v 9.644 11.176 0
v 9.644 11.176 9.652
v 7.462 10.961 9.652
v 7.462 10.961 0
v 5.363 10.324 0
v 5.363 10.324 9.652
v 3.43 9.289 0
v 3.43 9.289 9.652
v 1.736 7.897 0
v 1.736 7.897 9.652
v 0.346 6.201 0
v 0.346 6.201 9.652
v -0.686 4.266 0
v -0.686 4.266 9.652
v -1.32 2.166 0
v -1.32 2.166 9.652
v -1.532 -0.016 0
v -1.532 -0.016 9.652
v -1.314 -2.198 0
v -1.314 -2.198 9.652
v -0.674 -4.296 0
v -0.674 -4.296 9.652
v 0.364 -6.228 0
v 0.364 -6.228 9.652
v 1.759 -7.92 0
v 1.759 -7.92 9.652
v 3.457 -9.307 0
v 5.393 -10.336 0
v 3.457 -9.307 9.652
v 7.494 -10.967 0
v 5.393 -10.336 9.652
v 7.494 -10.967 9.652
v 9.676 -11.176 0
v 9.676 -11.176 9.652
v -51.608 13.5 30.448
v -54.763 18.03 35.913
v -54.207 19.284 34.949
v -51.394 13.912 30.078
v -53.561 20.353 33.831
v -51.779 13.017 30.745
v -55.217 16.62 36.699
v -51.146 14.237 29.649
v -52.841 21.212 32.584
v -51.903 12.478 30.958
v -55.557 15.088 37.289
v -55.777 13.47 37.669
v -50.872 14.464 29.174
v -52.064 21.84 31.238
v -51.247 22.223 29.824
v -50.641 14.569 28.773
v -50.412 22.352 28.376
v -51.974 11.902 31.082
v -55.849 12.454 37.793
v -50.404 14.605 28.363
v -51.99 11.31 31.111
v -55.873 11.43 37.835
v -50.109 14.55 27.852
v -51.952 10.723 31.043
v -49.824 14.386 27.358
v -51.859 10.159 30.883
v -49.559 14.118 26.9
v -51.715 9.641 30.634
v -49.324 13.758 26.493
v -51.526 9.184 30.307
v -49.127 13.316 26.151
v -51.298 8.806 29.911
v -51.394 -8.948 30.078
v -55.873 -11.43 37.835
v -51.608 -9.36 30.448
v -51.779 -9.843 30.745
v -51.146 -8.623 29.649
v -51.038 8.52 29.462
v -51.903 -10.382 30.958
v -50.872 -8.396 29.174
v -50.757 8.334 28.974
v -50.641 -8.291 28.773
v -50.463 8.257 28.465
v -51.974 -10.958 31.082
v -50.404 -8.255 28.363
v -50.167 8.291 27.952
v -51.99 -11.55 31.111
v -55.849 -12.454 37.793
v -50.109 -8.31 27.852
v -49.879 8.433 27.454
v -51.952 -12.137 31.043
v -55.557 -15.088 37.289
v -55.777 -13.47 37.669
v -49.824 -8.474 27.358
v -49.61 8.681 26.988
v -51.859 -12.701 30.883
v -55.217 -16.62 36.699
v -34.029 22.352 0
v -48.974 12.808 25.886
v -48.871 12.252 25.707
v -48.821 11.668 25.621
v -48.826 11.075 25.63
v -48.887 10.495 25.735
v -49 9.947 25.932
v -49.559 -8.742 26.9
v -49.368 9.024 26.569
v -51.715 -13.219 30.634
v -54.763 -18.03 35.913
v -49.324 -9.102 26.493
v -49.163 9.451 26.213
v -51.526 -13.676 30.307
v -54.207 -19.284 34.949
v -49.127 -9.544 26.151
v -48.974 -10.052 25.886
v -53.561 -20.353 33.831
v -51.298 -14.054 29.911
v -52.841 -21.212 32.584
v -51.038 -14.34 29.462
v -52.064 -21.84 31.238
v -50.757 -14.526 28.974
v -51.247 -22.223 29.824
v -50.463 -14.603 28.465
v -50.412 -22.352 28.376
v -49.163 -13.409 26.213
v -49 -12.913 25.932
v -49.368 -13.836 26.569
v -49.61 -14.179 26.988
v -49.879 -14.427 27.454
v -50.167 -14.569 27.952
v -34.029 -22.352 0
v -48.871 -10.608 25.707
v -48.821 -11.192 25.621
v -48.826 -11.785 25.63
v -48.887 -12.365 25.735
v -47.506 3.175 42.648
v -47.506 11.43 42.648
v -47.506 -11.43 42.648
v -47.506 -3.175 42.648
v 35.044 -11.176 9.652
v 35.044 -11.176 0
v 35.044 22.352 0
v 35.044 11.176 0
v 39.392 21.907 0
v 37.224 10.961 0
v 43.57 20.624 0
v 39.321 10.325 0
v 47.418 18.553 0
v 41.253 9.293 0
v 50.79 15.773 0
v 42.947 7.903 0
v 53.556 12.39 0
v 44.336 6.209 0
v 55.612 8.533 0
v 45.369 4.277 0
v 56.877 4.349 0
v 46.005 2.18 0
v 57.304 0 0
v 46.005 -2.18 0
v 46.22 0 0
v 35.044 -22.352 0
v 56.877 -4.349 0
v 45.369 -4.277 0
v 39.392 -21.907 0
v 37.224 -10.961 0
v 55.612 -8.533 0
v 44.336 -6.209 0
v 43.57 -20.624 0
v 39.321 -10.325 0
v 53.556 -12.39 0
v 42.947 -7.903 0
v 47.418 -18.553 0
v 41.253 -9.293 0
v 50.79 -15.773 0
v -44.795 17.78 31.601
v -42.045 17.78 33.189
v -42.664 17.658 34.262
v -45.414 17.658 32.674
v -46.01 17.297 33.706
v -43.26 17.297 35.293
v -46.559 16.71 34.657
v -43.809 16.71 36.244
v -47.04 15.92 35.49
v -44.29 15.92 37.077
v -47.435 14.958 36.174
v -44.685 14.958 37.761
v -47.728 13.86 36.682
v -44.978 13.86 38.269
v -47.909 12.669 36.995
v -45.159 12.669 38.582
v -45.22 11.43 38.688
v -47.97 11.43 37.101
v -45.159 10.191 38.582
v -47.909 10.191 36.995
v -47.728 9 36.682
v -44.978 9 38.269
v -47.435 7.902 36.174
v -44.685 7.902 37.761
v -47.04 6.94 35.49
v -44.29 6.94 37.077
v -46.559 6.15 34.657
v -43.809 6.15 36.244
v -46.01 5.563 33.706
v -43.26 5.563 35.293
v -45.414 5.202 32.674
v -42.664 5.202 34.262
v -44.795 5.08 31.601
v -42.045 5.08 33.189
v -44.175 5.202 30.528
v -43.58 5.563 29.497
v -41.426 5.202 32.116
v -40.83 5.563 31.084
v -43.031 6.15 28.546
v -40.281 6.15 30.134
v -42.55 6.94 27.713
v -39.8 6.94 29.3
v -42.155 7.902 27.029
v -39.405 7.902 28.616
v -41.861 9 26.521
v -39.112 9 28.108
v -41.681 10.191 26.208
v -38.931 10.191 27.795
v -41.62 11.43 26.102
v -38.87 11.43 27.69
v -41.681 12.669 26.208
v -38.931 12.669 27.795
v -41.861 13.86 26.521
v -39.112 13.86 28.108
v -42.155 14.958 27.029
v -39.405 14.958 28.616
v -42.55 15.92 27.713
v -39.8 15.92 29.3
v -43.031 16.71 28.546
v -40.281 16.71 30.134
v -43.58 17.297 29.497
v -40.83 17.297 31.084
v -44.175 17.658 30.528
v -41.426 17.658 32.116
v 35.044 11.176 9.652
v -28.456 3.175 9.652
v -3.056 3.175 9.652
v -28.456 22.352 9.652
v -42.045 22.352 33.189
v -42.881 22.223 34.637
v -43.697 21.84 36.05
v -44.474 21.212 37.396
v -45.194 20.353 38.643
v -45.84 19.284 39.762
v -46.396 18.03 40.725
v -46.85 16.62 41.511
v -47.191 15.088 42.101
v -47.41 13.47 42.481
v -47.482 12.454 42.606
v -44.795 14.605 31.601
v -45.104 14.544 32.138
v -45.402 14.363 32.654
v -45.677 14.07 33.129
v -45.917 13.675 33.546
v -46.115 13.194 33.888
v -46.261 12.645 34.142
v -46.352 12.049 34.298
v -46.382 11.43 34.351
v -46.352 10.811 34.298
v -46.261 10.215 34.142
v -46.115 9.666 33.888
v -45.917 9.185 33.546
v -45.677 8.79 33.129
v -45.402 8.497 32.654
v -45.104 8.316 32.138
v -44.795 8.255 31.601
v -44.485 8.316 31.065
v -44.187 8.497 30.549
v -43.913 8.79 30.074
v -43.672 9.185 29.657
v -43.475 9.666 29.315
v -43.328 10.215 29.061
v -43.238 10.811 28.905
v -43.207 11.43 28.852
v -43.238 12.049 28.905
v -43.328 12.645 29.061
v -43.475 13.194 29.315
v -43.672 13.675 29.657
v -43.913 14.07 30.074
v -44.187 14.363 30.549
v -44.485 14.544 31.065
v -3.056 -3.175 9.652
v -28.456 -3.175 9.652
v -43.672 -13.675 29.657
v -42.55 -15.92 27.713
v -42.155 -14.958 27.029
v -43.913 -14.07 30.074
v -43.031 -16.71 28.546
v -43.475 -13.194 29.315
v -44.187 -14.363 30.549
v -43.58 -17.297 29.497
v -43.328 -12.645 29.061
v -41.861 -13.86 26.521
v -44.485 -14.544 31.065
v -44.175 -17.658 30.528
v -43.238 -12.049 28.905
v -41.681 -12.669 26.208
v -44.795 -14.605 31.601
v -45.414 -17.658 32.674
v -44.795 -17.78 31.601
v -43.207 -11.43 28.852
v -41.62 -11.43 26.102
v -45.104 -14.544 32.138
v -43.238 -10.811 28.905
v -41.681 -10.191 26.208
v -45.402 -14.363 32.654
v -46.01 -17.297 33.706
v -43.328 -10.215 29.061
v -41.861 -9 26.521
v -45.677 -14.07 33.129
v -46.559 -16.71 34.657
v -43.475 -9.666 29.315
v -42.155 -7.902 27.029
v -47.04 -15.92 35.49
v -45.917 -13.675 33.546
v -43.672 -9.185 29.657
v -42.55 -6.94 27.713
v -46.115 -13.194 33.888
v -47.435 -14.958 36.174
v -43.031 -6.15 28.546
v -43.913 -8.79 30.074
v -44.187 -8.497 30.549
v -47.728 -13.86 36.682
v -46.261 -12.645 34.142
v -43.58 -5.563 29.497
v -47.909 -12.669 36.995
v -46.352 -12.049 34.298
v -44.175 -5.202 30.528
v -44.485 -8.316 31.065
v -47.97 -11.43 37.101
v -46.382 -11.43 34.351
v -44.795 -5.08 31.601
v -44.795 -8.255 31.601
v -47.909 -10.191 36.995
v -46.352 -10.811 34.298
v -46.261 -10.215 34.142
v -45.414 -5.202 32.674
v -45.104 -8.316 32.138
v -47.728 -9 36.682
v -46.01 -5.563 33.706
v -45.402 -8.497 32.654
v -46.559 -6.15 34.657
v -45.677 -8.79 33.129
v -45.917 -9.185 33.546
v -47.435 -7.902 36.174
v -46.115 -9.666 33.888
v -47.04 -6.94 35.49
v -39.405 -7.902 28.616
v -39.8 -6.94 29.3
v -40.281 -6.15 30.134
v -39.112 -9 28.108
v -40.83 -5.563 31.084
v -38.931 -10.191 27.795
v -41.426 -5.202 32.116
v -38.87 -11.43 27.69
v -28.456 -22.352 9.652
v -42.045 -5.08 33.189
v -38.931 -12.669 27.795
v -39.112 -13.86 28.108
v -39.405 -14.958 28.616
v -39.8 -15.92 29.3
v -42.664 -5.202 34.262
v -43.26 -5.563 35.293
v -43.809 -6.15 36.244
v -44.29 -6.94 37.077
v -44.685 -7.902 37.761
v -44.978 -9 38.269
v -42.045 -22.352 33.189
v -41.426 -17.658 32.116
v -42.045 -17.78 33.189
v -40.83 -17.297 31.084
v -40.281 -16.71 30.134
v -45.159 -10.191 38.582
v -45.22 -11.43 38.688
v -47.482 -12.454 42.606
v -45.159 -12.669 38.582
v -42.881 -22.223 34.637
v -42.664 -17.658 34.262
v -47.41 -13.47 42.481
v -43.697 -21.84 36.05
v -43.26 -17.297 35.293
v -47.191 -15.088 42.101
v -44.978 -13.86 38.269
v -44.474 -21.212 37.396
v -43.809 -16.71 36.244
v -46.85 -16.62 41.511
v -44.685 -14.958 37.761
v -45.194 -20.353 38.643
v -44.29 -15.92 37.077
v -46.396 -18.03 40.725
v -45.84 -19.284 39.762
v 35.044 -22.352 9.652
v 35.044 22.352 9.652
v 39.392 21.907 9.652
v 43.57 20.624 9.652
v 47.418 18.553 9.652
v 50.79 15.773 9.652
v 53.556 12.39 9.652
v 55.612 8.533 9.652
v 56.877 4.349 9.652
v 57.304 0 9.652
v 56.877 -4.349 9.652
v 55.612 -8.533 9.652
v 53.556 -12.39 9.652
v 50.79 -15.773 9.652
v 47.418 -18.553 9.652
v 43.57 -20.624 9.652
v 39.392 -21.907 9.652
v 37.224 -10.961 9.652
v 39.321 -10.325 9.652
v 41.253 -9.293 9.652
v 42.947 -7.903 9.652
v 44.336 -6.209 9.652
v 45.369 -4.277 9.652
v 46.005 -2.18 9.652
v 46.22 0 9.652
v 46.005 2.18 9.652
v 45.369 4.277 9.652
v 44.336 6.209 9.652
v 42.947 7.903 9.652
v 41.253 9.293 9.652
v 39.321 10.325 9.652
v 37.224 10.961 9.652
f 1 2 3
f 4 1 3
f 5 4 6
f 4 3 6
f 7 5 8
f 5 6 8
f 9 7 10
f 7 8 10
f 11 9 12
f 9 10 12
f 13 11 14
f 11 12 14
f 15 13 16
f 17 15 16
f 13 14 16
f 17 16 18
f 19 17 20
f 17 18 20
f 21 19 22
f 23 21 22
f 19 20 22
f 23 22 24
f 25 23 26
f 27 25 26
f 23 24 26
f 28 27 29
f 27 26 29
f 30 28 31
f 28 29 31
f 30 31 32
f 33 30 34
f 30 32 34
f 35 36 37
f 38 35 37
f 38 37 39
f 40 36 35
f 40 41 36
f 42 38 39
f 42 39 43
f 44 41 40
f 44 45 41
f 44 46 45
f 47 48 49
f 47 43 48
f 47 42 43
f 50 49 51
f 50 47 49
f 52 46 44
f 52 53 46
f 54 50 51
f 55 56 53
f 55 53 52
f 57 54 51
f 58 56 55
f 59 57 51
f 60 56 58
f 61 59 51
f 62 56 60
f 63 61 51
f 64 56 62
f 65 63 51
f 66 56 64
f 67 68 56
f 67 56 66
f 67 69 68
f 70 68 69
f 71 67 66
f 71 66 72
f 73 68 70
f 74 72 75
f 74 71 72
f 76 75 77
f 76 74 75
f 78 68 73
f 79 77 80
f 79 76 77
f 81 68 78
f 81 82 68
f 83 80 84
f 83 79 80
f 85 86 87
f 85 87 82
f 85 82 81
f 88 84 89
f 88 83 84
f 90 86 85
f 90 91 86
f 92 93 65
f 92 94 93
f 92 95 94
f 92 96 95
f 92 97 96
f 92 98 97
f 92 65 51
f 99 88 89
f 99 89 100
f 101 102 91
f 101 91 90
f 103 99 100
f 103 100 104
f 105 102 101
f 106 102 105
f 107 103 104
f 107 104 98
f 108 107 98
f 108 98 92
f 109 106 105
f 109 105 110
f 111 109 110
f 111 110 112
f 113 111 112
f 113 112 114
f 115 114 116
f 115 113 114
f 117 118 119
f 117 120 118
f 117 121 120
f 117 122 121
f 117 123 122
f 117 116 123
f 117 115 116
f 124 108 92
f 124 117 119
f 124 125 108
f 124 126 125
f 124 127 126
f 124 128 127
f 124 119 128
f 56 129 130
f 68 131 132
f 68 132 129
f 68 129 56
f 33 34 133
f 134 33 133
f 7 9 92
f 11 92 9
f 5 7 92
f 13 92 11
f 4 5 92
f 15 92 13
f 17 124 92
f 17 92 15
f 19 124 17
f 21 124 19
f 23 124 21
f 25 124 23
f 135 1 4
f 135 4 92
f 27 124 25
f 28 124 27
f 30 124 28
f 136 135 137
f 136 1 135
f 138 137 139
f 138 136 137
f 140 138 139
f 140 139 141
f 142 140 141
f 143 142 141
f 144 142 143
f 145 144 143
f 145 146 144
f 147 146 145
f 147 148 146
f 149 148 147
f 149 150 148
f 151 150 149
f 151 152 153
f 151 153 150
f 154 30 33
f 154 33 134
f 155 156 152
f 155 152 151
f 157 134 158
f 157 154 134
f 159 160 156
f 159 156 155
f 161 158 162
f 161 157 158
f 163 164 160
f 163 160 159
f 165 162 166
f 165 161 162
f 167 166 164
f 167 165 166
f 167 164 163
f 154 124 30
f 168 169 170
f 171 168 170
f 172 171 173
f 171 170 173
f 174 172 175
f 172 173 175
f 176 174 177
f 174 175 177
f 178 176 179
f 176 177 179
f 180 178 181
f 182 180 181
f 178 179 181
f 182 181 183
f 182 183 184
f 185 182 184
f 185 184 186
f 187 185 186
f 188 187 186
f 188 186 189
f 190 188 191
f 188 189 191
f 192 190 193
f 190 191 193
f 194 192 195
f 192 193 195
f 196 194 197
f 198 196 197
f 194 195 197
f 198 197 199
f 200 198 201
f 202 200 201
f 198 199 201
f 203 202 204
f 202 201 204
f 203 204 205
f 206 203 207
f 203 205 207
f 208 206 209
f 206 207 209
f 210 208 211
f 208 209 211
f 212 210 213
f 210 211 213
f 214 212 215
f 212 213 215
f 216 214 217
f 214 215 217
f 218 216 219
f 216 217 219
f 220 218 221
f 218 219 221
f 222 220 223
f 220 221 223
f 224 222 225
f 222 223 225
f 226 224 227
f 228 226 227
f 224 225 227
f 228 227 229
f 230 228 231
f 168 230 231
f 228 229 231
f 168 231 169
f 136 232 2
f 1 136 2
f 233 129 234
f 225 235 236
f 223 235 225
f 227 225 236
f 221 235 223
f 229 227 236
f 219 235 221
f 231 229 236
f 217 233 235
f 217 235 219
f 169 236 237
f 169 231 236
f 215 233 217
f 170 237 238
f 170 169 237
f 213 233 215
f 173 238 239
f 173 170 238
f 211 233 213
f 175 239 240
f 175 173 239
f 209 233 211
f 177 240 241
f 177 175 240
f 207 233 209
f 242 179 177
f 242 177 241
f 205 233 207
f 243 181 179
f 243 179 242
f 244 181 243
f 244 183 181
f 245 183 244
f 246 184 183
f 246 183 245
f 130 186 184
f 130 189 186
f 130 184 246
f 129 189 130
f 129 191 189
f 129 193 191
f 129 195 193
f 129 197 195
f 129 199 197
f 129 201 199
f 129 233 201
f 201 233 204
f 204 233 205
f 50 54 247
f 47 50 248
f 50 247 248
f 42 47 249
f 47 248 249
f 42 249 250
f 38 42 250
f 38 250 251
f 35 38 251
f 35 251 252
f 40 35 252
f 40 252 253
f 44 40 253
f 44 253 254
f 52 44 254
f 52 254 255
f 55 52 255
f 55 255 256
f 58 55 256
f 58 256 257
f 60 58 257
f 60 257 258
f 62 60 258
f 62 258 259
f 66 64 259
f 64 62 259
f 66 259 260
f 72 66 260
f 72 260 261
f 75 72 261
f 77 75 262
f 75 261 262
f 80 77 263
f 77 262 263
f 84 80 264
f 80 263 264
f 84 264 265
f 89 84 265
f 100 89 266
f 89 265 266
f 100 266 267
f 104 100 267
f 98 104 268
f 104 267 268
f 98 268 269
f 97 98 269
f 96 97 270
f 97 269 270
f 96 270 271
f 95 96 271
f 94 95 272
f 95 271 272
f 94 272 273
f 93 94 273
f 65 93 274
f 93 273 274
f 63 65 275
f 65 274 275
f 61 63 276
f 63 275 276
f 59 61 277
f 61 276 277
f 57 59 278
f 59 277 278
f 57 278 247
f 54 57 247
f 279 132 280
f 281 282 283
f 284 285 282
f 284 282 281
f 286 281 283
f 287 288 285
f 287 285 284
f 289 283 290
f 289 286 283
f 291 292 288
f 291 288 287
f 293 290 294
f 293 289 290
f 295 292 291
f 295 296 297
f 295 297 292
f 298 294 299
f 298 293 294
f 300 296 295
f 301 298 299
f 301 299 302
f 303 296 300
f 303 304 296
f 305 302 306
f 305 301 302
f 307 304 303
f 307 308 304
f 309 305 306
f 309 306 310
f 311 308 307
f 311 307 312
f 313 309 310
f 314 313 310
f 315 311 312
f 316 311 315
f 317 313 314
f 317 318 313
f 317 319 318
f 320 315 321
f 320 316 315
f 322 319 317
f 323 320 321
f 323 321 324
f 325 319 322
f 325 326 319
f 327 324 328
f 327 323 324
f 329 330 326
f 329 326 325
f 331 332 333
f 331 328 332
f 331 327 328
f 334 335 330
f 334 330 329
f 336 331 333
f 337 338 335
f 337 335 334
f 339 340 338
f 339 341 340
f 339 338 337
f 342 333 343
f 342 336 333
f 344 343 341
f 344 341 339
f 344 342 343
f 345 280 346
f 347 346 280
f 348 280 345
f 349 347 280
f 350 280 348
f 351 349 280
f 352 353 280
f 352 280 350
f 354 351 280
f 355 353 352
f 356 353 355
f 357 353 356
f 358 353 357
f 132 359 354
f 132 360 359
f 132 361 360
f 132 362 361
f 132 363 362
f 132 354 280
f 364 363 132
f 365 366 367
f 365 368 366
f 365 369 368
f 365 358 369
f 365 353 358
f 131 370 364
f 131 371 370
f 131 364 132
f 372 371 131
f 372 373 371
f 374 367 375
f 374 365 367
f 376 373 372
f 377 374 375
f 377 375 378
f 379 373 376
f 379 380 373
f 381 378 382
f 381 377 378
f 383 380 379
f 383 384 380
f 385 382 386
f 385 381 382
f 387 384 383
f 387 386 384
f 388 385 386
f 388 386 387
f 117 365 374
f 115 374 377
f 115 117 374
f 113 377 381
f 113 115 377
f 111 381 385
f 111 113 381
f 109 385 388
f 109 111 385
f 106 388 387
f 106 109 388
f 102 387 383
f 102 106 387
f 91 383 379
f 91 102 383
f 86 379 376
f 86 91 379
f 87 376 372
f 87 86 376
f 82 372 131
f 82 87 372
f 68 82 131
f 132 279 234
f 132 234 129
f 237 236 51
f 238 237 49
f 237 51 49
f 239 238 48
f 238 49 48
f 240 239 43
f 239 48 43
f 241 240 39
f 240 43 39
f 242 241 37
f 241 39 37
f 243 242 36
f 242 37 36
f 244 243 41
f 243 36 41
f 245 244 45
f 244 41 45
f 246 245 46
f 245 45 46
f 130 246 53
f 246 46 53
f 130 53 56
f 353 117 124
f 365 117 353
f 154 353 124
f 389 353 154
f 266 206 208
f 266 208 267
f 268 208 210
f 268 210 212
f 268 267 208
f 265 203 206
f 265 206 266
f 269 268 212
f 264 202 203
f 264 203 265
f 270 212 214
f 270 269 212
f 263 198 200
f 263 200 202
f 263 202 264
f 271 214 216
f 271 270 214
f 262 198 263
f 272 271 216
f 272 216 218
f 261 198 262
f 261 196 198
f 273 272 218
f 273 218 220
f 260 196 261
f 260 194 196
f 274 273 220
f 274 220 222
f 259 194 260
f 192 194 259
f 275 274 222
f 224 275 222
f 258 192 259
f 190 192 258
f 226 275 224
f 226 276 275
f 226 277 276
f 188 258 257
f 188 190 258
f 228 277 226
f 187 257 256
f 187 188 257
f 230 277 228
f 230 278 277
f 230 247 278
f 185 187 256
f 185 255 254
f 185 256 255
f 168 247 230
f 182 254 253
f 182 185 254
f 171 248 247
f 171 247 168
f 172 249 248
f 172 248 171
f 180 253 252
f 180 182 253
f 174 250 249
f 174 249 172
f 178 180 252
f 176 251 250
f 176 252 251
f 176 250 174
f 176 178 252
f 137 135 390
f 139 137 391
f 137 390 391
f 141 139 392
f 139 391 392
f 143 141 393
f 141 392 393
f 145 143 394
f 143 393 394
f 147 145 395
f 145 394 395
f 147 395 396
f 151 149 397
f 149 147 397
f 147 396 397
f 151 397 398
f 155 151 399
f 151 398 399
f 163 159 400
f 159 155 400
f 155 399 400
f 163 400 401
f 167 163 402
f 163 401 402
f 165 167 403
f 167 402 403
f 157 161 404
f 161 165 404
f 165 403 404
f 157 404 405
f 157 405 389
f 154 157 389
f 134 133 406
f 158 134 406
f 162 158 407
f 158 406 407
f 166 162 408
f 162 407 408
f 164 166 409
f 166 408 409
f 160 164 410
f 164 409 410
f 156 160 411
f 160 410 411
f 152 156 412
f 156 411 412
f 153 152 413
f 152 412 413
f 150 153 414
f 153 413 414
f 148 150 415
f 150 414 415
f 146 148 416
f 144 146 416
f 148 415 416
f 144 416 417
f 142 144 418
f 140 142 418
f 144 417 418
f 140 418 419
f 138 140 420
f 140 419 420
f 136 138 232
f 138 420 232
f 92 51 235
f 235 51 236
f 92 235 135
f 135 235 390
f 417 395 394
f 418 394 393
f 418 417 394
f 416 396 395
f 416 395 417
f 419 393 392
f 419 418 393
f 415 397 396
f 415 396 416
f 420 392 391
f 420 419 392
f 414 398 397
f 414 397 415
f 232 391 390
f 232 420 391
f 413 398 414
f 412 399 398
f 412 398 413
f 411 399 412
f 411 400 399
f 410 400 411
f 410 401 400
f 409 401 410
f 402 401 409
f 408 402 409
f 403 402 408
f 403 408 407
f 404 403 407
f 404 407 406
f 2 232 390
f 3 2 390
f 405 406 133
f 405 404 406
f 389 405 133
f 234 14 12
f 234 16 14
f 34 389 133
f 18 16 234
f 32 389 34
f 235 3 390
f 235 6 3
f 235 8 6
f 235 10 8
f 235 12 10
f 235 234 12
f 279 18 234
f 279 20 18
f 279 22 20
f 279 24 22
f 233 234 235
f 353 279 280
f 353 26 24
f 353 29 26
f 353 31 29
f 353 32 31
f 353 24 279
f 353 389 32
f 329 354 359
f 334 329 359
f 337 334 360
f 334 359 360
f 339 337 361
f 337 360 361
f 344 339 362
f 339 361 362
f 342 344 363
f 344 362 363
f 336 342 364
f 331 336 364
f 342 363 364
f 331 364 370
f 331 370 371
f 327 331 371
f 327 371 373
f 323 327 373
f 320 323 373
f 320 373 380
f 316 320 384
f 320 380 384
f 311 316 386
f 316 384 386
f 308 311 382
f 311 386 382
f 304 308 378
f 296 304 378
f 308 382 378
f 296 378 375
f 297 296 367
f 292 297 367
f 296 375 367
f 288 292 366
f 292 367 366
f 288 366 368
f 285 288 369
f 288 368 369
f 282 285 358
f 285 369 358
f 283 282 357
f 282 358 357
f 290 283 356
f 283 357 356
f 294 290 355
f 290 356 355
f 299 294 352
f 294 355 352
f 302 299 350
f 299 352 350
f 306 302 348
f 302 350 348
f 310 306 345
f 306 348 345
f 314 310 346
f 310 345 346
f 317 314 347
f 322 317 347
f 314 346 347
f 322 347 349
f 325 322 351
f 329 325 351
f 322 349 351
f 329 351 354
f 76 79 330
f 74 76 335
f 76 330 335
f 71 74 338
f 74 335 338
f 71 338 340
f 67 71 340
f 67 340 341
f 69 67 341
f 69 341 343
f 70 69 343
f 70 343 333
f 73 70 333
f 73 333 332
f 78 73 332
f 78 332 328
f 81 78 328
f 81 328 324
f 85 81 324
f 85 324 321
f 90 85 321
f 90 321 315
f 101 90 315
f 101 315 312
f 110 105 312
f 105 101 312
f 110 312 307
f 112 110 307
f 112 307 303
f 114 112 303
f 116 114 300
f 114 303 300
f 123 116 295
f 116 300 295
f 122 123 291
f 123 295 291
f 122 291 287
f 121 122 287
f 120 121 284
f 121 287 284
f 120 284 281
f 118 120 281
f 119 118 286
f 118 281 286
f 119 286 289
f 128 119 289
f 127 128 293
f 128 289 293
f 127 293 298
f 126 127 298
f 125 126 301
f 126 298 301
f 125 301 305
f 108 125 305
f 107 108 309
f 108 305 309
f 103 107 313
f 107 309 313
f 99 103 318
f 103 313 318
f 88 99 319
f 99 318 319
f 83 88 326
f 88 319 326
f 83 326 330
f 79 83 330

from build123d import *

# Parameters (mm, degrees)
F1_DEPTH = 22.352
F2_DEPTH = 3.175
F4_DEPTH = 25.4
F5_R     = 6.35
F5_R_2   = 3.175
F6_DEPTH = 3.175
F7_DEPTH = 25.4
F8_R     = 10.922


with BuildPart() as f1:
    # F0 (on Front) → F1 (new body, symmetric)
    with BuildSketch(Plane.XZ):
        Polygon((-34.0286190226, 0), (57.3959515745, 0), (57.3959515745, 9.652), (-3.0560484255, 9.652), (-28.4560484255, 9.652), (-47.5060484255, 42.6475678842), (-55.8726190226, 37.8349178405), align=None)
    extrude(amount=F1_DEPTH, both=True)

    # F0 (on Front) → F2 (join, symmetric)
    with BuildSketch(Plane.XZ):
        Polygon((-28.4560484255, 9.652), (-3.0560484255, 9.652), (-47.5060484255, 42.6475678842), align=None)
    extrude(amount=F2_DEPTH, both=True)

    # F3 (on face) → F4 (cut)
    with BuildSketch(Plane.XY.offset(9.652)):
        with BuildLine():
            ThreePointArc((35.0439515745, 22.352), (57.3043185829, -1.03671e-05), (35.043930755, -22.352))
            Line((35.043930755, -22.352), (57.3959515745, -22.352))
            Line((57.3959515745, -22.352), (57.3959515745, 22.352))
            Line((57.3959515745, 22.352), (35.0439515745, 22.352))
        make_face()
        with BuildLine():
            Line((35.0439515745, 11.176), (9.6439515745, 11.176))
            ThreePointArc((9.6439515745, 11.176), (-1.5320366113, -0.0162502311), (9.6764520023, -11.1759527434))
            Line((9.6764520023, -11.1759527434), (35.043930755, -11.176))
            ThreePointArc((35.043930755, -11.176), (46.2199515745, -1.04098e-05), (35.0439515745, 11.176))
        make_face()
    extrude(amount=-F4_DEPTH, mode=Mode.SUBTRACT)

    # F5 (on face) → F6 (cut)
    with BuildSketch(Plane(origin=(-17.1625977204, 0, -9.9088304139), x_dir=(0, 1, 0), z_dir=(0.8660254038, 0, 0.5))):
        with Locations((11.43, 49.7649014101)):
            Circle(F5_R)
        with Locations((11.43, 49.7649014101)):
            Circle(F5_R_2, mode=Mode.SUBTRACT)
        with Locations((-11.43, 49.7649014101)):
            Circle(F5_R)
        with Locations((-11.43, 49.7649014101)):
            Circle(F5_R_2, mode=Mode.SUBTRACT)
    extrude(amount=-F6_DEPTH, mode=Mode.SUBTRACT)

    # F7 (cut): faces of the model
    f7_faces = [f1.faces().sort_by_distance(p)[0] for p in [
        (-42.0450484255, -11.43, 33.1888384241),
        (-42.0450484255, 11.43, 33.1888384241),
    ]]
    extrude(f7_faces, amount=-F7_DEPTH, mode=Mode.SUBTRACT)

    # F8
    f8_edges = [f1.edges().sort_by_distance(p)[0] for p in [
        (-51.689334, -22.352, 40.241243),
        (-51.689334, 22.352, 40.241243),
    ]]
    fillet(f8_edges, radius=F8_R)


solid = f1.part
